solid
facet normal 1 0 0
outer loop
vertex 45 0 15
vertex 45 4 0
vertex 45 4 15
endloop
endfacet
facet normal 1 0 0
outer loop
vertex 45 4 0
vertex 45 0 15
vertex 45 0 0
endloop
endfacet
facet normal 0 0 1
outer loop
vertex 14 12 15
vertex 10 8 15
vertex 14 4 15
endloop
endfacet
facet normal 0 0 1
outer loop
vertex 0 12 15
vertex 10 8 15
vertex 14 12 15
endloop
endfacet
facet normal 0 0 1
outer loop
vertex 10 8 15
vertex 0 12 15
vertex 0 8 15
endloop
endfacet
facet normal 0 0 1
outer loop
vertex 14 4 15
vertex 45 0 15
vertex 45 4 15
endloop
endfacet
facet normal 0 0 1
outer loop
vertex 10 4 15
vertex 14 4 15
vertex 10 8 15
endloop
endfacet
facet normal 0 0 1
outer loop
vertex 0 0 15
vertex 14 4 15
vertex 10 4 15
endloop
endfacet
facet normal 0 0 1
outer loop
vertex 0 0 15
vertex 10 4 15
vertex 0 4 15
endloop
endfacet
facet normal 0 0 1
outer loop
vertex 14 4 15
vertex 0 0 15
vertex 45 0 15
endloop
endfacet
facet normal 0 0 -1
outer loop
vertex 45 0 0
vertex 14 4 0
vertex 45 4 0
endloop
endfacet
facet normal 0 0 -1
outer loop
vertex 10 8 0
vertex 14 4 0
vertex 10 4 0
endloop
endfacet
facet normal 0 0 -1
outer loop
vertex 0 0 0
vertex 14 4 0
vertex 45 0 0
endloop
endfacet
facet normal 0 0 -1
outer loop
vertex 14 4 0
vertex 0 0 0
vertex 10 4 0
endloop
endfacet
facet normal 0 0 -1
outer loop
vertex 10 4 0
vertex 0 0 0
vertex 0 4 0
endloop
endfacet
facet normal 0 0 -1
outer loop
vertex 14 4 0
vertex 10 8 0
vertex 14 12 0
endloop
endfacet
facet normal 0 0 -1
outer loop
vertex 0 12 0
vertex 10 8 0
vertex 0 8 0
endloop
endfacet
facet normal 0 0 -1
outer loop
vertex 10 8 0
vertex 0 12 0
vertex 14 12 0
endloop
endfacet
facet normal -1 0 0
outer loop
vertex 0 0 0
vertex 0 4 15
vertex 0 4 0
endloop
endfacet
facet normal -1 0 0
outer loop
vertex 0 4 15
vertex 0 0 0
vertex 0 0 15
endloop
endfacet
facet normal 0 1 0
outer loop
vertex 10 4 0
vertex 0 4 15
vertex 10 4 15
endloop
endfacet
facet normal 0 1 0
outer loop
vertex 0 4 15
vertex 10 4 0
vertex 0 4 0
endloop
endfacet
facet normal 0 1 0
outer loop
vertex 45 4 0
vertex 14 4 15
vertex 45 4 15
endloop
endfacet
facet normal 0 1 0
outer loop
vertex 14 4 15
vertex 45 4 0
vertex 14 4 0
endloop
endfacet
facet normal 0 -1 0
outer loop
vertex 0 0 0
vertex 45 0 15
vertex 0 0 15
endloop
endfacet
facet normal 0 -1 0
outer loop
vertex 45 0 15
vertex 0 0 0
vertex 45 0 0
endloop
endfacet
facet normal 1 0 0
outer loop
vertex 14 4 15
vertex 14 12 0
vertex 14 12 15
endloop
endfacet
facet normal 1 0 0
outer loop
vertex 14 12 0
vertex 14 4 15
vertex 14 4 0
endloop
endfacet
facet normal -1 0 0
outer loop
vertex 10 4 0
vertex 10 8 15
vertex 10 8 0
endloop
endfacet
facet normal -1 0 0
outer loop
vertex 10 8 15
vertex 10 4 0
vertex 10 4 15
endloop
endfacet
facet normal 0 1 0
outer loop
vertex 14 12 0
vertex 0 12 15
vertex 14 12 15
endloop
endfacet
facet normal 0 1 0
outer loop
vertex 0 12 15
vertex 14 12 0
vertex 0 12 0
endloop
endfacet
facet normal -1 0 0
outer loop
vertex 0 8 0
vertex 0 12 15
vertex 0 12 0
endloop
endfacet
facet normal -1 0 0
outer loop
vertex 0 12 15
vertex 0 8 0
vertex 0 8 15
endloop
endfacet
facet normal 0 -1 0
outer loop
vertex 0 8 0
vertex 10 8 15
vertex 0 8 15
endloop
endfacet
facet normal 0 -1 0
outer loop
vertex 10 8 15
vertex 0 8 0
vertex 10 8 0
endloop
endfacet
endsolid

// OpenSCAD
GEN_TN = 4;
GEN_WD = 15;
WALL_BASE_LN = 45;
HOOK_HT = 10;
HOOK_SPAN = 4;


// Wall base
cube([WALL_BASE_LN, GEN_TN, GEN_WD]);

// shoulder 
translate([HOOK_HT, 0, 0])
    cube([GEN_TN , HOOK_SPAN + (GEN_TN * 2),GEN_WD]);

// hook spur
translate([0, HOOK_SPAN + GEN_TN, 0])
    cube([HOOK_HT , GEN_TN,GEN_WD]);
